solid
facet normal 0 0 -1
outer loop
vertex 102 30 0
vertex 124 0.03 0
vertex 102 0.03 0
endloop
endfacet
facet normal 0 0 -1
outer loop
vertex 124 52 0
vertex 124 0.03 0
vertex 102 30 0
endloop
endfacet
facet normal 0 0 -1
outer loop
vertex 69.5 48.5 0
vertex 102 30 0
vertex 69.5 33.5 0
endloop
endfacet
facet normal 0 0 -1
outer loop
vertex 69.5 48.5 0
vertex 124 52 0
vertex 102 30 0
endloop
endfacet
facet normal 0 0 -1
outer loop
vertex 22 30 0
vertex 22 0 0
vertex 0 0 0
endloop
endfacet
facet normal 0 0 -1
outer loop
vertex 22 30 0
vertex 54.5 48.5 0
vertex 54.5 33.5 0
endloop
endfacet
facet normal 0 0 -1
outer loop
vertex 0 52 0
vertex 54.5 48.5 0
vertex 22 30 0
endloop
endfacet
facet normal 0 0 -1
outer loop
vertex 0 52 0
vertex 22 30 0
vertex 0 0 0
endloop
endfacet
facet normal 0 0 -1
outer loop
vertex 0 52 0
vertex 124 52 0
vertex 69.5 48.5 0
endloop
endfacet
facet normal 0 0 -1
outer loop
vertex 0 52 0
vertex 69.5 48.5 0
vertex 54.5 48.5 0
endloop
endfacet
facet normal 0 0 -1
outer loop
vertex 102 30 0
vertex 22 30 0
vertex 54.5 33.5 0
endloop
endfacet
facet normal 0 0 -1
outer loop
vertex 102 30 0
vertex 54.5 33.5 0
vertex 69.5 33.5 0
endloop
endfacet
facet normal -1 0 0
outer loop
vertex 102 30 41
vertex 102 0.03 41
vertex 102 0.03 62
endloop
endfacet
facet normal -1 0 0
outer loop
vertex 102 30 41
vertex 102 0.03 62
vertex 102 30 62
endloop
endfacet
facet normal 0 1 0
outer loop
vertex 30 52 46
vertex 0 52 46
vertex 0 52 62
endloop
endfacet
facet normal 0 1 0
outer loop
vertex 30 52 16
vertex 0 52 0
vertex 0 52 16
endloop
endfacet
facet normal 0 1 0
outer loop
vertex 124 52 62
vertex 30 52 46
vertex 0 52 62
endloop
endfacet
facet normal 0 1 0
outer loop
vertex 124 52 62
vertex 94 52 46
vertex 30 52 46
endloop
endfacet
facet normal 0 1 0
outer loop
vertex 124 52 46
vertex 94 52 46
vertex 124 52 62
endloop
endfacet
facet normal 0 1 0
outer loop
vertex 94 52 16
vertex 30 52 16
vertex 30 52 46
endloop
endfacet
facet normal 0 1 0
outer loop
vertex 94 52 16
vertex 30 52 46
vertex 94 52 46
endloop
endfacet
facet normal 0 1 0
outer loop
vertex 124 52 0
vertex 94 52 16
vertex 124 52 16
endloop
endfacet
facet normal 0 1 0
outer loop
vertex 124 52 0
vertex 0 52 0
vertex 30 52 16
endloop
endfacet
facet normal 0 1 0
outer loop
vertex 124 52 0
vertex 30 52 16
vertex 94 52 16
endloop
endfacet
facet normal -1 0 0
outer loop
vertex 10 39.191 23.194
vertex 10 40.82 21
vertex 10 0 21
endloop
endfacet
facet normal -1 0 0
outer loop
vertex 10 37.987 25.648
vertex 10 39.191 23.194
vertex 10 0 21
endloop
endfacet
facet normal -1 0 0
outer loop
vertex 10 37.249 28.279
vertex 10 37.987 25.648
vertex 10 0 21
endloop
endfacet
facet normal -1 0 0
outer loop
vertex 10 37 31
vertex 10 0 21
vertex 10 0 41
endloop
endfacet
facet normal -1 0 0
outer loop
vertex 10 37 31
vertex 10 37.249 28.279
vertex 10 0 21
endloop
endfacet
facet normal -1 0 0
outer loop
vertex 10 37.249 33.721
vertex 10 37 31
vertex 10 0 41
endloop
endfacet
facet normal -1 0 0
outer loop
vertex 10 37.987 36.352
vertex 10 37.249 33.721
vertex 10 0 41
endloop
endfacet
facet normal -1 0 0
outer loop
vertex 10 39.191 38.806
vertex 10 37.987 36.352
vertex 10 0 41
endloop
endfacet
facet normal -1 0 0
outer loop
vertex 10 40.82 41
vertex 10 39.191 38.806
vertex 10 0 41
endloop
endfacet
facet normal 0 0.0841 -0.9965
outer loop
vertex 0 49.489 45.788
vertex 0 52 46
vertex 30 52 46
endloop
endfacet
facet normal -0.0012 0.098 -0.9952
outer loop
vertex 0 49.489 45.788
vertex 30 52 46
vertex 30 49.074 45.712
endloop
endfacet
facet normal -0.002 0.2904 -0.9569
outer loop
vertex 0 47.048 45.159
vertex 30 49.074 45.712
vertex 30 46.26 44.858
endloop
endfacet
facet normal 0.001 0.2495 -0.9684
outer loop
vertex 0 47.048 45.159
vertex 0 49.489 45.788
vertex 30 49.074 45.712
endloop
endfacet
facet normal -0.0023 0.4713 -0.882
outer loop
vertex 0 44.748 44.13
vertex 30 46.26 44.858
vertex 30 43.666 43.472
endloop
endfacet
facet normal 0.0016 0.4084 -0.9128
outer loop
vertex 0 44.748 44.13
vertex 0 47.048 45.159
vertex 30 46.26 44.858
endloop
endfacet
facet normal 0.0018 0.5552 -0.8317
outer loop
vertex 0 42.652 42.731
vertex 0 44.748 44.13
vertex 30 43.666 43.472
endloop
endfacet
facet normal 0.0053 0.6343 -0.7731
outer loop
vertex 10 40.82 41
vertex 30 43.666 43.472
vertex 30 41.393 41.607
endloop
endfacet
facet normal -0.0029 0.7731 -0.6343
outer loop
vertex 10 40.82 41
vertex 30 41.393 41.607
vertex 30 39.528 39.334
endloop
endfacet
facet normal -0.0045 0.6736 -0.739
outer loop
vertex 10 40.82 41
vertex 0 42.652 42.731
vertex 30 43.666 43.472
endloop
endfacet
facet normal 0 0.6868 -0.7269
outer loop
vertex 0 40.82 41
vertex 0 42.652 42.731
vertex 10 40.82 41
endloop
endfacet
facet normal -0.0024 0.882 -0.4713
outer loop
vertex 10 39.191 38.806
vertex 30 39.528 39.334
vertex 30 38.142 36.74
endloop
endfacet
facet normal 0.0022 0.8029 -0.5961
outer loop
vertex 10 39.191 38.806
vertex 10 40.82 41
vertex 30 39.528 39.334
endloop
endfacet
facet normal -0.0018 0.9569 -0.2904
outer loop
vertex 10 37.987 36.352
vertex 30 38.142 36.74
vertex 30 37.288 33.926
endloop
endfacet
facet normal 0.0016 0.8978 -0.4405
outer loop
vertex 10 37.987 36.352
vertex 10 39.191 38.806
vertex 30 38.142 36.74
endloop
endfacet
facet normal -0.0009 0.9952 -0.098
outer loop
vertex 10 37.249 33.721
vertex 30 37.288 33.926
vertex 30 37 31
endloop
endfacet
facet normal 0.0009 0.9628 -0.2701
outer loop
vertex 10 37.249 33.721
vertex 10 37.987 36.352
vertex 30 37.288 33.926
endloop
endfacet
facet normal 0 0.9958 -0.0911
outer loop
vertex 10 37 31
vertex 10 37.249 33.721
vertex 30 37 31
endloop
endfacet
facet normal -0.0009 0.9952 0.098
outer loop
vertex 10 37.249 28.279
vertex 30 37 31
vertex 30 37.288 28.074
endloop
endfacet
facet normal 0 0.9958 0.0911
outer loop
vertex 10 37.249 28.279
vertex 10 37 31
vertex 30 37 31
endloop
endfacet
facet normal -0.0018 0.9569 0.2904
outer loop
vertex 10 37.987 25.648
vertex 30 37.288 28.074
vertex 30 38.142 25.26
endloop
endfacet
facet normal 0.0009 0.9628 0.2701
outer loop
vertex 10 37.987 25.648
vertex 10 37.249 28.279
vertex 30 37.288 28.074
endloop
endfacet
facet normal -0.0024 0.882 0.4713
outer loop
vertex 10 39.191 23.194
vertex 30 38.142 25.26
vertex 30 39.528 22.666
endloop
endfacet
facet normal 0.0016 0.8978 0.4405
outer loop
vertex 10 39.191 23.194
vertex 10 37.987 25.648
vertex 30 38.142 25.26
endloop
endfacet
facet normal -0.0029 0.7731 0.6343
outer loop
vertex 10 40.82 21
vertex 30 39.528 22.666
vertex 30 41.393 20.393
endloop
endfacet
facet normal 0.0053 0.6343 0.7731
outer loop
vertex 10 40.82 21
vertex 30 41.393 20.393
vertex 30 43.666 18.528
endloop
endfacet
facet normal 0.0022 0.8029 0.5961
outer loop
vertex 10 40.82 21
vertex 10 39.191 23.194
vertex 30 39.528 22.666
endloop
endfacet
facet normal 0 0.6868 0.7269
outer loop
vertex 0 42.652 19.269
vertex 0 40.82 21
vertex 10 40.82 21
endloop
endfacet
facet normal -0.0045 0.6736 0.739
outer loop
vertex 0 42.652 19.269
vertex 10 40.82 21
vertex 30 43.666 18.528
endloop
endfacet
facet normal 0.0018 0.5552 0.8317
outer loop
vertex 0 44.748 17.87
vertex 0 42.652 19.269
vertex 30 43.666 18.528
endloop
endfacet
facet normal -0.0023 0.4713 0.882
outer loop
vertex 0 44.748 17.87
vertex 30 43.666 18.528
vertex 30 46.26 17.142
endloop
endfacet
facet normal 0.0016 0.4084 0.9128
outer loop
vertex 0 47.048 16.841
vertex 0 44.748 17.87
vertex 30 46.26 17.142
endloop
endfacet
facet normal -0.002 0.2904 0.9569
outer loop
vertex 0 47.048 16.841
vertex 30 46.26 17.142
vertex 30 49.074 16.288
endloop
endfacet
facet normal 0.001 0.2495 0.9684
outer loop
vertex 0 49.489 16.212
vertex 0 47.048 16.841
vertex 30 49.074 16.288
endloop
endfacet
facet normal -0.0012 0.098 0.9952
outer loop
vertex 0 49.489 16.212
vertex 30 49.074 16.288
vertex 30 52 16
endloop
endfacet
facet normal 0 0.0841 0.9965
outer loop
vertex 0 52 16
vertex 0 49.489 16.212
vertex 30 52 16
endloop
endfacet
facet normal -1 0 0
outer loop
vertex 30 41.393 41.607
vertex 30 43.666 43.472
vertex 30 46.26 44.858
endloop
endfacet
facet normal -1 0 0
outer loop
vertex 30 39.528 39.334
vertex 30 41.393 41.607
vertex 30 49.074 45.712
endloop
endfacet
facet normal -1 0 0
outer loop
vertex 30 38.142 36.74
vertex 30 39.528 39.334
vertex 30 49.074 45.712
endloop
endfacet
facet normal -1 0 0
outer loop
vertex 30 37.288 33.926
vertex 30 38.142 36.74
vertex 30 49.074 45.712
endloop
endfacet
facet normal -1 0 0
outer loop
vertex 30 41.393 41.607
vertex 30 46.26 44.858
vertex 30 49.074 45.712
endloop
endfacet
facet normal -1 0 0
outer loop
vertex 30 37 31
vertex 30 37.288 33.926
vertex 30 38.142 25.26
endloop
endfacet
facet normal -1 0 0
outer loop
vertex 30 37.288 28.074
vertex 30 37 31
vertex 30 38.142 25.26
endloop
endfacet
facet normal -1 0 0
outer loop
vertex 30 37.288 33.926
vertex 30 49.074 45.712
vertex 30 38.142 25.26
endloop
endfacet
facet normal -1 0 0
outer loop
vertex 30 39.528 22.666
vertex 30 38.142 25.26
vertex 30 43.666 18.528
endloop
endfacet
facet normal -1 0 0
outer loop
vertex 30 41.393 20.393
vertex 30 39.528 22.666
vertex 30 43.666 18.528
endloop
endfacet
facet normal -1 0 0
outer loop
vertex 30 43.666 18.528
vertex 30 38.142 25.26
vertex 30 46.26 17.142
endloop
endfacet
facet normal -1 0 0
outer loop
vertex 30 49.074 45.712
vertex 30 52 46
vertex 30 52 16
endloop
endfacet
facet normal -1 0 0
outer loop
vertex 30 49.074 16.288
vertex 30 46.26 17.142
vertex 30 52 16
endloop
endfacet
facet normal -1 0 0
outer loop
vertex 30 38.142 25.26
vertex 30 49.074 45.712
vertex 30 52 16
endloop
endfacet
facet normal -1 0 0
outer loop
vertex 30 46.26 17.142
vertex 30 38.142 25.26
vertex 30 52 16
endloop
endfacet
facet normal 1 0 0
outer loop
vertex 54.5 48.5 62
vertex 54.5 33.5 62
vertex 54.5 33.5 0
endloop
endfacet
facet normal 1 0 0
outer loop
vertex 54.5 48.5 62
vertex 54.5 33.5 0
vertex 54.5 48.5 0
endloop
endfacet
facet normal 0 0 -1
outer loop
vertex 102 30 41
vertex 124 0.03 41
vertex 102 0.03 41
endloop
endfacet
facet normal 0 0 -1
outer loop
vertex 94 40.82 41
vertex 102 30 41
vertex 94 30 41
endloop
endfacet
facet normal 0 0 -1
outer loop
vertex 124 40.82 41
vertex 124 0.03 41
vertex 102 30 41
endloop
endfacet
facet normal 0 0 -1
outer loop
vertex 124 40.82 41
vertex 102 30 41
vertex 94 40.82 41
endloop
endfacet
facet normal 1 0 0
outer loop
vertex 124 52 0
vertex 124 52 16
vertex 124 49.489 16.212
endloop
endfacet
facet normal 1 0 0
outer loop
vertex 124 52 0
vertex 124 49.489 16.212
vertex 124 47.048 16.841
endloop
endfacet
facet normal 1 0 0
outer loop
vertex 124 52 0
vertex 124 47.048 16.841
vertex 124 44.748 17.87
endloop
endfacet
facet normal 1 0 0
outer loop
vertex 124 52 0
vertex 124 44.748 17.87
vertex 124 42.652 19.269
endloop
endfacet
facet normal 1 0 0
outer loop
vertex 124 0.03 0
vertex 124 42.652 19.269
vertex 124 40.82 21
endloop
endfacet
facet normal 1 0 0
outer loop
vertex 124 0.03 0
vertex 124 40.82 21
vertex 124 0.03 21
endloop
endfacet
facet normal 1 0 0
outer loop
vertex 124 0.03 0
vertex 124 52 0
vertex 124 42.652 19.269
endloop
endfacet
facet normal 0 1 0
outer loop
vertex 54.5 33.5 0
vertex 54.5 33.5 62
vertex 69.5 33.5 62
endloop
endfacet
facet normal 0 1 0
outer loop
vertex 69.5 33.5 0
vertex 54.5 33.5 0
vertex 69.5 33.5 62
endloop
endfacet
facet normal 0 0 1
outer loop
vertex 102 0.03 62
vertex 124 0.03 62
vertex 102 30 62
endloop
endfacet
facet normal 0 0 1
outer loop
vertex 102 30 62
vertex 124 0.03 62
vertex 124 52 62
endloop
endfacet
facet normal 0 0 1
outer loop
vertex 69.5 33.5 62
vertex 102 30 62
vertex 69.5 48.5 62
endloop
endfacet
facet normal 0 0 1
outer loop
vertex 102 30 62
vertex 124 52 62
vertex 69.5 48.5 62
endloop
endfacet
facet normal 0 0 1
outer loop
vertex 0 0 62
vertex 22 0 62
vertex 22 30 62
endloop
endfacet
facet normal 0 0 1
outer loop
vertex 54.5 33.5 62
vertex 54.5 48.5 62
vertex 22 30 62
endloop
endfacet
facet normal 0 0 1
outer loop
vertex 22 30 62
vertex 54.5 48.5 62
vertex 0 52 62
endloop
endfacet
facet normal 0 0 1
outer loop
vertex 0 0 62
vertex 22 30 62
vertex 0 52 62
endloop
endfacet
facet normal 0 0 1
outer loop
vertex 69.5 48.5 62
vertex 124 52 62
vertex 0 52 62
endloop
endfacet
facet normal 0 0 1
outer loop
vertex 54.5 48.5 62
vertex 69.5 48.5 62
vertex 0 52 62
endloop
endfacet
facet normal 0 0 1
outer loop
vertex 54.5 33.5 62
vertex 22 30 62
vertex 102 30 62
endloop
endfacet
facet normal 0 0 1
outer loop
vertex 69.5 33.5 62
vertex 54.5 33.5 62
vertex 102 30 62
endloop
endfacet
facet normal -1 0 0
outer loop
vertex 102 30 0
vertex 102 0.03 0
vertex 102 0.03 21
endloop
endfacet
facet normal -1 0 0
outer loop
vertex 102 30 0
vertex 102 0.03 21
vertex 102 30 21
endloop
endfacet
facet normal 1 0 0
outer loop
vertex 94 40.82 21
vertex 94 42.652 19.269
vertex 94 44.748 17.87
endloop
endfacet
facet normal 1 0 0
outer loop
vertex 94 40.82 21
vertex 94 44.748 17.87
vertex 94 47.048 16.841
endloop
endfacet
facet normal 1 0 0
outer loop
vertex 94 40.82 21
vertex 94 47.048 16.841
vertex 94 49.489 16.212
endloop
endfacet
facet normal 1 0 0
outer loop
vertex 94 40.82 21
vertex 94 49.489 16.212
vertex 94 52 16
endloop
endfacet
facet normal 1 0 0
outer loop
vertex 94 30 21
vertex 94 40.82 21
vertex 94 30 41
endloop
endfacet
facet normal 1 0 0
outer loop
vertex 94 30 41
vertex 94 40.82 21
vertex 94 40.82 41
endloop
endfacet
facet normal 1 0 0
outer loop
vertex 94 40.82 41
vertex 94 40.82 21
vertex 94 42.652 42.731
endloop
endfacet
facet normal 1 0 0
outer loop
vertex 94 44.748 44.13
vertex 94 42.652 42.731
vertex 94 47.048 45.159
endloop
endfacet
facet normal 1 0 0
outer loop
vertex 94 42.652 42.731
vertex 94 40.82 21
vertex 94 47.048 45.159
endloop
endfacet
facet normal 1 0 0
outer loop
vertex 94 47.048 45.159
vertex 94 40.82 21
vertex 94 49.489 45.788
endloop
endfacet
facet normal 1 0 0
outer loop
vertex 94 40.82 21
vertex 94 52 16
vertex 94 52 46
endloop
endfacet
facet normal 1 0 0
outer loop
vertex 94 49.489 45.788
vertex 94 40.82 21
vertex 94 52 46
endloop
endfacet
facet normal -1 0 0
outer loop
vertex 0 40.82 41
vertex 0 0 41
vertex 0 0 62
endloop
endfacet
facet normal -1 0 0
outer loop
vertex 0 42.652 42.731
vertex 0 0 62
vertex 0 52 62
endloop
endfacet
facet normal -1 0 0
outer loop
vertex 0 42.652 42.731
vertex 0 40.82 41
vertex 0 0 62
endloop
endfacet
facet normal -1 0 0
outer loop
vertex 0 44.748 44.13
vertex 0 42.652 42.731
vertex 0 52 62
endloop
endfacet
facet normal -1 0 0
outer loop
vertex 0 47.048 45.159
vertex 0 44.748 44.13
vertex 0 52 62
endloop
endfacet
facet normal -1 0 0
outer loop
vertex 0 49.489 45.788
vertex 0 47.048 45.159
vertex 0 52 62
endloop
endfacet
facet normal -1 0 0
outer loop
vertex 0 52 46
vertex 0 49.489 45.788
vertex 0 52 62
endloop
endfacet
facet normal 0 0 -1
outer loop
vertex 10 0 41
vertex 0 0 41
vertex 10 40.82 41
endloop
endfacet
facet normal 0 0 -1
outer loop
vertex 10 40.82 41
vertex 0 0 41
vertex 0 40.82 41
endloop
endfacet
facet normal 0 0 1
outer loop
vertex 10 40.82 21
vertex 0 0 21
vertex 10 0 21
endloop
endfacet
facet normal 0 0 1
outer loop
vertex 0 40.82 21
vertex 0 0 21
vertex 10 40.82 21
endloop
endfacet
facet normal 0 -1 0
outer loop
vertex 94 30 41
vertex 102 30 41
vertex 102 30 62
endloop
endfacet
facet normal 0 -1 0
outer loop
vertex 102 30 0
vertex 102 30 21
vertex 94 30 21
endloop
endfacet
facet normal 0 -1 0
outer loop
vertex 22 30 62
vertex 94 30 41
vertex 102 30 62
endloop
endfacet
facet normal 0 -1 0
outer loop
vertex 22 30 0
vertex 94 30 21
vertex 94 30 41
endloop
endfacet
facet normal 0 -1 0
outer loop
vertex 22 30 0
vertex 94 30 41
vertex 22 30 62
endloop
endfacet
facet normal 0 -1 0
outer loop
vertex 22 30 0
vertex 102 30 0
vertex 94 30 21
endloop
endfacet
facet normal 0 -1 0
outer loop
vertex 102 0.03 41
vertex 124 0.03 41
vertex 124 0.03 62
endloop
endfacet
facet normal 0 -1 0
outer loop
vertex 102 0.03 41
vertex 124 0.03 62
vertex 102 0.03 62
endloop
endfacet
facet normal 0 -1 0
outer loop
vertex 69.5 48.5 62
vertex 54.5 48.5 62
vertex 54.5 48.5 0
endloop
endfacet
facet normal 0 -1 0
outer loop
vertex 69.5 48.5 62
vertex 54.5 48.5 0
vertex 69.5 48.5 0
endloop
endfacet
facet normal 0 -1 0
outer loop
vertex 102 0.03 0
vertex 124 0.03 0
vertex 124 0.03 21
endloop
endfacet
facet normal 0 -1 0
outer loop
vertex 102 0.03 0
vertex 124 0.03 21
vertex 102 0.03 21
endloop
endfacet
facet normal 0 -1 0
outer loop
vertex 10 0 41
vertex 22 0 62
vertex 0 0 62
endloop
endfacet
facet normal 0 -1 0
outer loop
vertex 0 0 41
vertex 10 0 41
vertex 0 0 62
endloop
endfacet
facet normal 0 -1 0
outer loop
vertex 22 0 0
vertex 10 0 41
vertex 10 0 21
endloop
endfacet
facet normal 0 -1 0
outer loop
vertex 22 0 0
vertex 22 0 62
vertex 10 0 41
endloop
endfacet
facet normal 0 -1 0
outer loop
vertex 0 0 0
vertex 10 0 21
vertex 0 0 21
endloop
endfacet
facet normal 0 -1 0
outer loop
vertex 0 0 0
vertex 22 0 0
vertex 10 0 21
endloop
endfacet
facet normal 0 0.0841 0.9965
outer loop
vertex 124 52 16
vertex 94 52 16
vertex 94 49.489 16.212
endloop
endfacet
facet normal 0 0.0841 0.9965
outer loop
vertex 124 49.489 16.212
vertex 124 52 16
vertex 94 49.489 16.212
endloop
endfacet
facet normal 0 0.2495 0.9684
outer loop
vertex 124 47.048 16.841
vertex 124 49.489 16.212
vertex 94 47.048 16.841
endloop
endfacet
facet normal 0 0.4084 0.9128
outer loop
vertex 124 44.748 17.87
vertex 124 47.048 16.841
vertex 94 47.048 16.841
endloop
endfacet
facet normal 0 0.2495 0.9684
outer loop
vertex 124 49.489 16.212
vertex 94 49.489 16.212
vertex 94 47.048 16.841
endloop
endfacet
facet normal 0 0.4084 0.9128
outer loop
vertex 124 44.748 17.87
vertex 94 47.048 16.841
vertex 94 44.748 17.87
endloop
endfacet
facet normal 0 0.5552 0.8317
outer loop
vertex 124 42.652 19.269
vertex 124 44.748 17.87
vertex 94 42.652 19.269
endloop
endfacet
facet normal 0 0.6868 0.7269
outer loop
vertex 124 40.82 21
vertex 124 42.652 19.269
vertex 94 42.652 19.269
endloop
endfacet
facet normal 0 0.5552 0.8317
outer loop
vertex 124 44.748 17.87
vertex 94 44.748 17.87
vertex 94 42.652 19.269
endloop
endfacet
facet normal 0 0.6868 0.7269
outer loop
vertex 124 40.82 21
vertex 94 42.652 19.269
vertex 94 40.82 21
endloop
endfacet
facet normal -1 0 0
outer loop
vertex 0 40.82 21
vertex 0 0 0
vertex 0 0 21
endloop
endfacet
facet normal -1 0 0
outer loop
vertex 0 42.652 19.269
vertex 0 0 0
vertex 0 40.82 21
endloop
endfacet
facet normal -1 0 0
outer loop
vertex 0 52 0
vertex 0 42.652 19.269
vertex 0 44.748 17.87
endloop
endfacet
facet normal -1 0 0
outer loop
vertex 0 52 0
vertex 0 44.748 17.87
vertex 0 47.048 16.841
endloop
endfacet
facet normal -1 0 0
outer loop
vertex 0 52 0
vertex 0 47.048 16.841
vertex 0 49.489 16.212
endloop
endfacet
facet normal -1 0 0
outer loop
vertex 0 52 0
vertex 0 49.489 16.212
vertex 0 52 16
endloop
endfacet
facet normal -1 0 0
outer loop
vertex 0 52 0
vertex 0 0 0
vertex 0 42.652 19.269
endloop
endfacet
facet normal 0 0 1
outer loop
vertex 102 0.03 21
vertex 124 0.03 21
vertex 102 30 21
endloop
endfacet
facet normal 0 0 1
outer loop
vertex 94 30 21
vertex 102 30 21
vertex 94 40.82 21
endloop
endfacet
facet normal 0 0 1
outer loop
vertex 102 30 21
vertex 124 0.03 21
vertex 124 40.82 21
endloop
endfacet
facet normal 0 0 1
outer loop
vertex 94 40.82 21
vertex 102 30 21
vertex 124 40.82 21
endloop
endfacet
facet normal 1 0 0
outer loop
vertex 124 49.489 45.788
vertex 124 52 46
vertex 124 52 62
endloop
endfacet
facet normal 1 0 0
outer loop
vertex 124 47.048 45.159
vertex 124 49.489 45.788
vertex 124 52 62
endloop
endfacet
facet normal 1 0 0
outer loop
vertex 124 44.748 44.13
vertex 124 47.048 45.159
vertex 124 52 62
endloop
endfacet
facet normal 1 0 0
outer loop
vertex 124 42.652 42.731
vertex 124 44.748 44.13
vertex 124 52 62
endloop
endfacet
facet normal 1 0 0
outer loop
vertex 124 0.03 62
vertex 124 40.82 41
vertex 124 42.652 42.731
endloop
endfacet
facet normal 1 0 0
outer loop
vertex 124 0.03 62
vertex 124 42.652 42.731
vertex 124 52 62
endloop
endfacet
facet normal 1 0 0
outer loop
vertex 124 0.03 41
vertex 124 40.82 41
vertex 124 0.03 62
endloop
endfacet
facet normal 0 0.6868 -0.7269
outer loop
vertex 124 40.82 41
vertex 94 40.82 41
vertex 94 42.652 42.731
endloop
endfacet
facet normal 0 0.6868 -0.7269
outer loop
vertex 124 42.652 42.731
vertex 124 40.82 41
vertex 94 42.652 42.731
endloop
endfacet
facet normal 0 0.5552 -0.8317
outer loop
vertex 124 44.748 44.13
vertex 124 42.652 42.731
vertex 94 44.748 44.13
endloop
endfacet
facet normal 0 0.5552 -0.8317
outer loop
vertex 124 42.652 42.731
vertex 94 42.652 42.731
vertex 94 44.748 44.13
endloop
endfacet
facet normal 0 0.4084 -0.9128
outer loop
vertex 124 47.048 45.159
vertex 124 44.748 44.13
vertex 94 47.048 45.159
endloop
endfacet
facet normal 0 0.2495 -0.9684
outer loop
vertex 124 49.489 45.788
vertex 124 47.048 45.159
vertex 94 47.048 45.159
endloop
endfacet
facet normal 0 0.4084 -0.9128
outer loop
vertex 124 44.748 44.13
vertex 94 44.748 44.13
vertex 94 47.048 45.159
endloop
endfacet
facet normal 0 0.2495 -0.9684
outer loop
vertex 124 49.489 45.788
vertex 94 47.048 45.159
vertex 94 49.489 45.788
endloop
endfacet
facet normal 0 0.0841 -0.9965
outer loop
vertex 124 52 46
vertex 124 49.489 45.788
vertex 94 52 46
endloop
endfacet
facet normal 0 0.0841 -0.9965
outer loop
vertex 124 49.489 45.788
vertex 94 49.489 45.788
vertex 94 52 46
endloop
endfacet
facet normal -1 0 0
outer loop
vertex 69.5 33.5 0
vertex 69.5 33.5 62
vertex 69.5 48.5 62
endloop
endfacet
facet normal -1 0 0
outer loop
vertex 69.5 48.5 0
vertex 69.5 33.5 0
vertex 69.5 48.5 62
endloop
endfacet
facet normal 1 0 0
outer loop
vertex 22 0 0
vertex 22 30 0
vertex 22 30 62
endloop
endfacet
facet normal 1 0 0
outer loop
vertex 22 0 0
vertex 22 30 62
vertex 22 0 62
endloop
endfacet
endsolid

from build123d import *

# Parameters (mm, degrees)
SKETCH1_W           = 15
SKETCH1_H           = 15
BOSS_EXTRUDE2_DEPTH = 62
SKETCH2_W           = 20
SKETCH2_H           = 52
CUT_EXTRUDE1_DEPTH  = 10
CUT_EXTRUDE2_DEPTH  = 30
SKETCH5_W           = 20
SKETCH5_H           = 52
CUT_EXTRUDE4_DEPTH  = 30
CUT_EXTRUDE5_START  = -30
CUT_EXTRUDE5_DEPTH  = 30


with BuildPart() as part:
    # Sketch1 → Boss-Extrude2 (new body)
    with BuildSketch(Plane.XY):
        Polygon((0, 0), (0, 52), (124, 52), (124, 0.029795627), (102, 0.029795627), (102, 30), (22, 30), (22, 0), align=None)
        with Locations((62, 41)):
            Rectangle(SKETCH1_W, SKETCH1_H, mode=Mode.SUBTRACT)
    extrude(amount=BOSS_EXTRUDE2_DEPTH)

    # Sketch2 → Cut-Extrude1 (cut)
    with BuildSketch(Plane.ZY):
        with Locations((31, 26)):
            Rectangle(SKETCH2_W, SKETCH2_H)
    extrude(amount=-CUT_EXTRUDE1_DEPTH, mode=Mode.SUBTRACT)

    # Sketch3 → Cut-Extrude2 (cut)
    with BuildSketch(Plane.ZY):
        with BuildLine():
            Line((16, 52), (46, 52))
            ThreePointArc((46, 52), (31, 37), (16, 52))
        make_face()
    extrude(amount=-CUT_EXTRUDE2_DEPTH, mode=Mode.SUBTRACT)

    # Sketch5 → Cut-Extrude4 (cut)
    with BuildSketch(Plane(origin=(124, 0, 0), x_dir=(0, 0, -1), z_dir=(1, 0, 0))):
        with Locations((-31, 26)):
            Rectangle(SKETCH5_W, SKETCH5_H)
    extrude(amount=-CUT_EXTRUDE4_DEPTH, mode=Mode.SUBTRACT)

    # Sketch6 → Cut-Extrude5 (cut)
    with BuildSketch(Plane(origin=(124, 0, 0), x_dir=(0, 0, -1), z_dir=(1, 0, 0)).offset(CUT_EXTRUDE5_START)):
        with BuildLine():
            Line((-46, 52), (-16, 52))
            ThreePointArc((-16, 52), (-31, 37), (-46, 52))
        make_face()
    extrude(amount=CUT_EXTRUDE5_DEPTH, mode=Mode.SUBTRACT)


solid = part.part
